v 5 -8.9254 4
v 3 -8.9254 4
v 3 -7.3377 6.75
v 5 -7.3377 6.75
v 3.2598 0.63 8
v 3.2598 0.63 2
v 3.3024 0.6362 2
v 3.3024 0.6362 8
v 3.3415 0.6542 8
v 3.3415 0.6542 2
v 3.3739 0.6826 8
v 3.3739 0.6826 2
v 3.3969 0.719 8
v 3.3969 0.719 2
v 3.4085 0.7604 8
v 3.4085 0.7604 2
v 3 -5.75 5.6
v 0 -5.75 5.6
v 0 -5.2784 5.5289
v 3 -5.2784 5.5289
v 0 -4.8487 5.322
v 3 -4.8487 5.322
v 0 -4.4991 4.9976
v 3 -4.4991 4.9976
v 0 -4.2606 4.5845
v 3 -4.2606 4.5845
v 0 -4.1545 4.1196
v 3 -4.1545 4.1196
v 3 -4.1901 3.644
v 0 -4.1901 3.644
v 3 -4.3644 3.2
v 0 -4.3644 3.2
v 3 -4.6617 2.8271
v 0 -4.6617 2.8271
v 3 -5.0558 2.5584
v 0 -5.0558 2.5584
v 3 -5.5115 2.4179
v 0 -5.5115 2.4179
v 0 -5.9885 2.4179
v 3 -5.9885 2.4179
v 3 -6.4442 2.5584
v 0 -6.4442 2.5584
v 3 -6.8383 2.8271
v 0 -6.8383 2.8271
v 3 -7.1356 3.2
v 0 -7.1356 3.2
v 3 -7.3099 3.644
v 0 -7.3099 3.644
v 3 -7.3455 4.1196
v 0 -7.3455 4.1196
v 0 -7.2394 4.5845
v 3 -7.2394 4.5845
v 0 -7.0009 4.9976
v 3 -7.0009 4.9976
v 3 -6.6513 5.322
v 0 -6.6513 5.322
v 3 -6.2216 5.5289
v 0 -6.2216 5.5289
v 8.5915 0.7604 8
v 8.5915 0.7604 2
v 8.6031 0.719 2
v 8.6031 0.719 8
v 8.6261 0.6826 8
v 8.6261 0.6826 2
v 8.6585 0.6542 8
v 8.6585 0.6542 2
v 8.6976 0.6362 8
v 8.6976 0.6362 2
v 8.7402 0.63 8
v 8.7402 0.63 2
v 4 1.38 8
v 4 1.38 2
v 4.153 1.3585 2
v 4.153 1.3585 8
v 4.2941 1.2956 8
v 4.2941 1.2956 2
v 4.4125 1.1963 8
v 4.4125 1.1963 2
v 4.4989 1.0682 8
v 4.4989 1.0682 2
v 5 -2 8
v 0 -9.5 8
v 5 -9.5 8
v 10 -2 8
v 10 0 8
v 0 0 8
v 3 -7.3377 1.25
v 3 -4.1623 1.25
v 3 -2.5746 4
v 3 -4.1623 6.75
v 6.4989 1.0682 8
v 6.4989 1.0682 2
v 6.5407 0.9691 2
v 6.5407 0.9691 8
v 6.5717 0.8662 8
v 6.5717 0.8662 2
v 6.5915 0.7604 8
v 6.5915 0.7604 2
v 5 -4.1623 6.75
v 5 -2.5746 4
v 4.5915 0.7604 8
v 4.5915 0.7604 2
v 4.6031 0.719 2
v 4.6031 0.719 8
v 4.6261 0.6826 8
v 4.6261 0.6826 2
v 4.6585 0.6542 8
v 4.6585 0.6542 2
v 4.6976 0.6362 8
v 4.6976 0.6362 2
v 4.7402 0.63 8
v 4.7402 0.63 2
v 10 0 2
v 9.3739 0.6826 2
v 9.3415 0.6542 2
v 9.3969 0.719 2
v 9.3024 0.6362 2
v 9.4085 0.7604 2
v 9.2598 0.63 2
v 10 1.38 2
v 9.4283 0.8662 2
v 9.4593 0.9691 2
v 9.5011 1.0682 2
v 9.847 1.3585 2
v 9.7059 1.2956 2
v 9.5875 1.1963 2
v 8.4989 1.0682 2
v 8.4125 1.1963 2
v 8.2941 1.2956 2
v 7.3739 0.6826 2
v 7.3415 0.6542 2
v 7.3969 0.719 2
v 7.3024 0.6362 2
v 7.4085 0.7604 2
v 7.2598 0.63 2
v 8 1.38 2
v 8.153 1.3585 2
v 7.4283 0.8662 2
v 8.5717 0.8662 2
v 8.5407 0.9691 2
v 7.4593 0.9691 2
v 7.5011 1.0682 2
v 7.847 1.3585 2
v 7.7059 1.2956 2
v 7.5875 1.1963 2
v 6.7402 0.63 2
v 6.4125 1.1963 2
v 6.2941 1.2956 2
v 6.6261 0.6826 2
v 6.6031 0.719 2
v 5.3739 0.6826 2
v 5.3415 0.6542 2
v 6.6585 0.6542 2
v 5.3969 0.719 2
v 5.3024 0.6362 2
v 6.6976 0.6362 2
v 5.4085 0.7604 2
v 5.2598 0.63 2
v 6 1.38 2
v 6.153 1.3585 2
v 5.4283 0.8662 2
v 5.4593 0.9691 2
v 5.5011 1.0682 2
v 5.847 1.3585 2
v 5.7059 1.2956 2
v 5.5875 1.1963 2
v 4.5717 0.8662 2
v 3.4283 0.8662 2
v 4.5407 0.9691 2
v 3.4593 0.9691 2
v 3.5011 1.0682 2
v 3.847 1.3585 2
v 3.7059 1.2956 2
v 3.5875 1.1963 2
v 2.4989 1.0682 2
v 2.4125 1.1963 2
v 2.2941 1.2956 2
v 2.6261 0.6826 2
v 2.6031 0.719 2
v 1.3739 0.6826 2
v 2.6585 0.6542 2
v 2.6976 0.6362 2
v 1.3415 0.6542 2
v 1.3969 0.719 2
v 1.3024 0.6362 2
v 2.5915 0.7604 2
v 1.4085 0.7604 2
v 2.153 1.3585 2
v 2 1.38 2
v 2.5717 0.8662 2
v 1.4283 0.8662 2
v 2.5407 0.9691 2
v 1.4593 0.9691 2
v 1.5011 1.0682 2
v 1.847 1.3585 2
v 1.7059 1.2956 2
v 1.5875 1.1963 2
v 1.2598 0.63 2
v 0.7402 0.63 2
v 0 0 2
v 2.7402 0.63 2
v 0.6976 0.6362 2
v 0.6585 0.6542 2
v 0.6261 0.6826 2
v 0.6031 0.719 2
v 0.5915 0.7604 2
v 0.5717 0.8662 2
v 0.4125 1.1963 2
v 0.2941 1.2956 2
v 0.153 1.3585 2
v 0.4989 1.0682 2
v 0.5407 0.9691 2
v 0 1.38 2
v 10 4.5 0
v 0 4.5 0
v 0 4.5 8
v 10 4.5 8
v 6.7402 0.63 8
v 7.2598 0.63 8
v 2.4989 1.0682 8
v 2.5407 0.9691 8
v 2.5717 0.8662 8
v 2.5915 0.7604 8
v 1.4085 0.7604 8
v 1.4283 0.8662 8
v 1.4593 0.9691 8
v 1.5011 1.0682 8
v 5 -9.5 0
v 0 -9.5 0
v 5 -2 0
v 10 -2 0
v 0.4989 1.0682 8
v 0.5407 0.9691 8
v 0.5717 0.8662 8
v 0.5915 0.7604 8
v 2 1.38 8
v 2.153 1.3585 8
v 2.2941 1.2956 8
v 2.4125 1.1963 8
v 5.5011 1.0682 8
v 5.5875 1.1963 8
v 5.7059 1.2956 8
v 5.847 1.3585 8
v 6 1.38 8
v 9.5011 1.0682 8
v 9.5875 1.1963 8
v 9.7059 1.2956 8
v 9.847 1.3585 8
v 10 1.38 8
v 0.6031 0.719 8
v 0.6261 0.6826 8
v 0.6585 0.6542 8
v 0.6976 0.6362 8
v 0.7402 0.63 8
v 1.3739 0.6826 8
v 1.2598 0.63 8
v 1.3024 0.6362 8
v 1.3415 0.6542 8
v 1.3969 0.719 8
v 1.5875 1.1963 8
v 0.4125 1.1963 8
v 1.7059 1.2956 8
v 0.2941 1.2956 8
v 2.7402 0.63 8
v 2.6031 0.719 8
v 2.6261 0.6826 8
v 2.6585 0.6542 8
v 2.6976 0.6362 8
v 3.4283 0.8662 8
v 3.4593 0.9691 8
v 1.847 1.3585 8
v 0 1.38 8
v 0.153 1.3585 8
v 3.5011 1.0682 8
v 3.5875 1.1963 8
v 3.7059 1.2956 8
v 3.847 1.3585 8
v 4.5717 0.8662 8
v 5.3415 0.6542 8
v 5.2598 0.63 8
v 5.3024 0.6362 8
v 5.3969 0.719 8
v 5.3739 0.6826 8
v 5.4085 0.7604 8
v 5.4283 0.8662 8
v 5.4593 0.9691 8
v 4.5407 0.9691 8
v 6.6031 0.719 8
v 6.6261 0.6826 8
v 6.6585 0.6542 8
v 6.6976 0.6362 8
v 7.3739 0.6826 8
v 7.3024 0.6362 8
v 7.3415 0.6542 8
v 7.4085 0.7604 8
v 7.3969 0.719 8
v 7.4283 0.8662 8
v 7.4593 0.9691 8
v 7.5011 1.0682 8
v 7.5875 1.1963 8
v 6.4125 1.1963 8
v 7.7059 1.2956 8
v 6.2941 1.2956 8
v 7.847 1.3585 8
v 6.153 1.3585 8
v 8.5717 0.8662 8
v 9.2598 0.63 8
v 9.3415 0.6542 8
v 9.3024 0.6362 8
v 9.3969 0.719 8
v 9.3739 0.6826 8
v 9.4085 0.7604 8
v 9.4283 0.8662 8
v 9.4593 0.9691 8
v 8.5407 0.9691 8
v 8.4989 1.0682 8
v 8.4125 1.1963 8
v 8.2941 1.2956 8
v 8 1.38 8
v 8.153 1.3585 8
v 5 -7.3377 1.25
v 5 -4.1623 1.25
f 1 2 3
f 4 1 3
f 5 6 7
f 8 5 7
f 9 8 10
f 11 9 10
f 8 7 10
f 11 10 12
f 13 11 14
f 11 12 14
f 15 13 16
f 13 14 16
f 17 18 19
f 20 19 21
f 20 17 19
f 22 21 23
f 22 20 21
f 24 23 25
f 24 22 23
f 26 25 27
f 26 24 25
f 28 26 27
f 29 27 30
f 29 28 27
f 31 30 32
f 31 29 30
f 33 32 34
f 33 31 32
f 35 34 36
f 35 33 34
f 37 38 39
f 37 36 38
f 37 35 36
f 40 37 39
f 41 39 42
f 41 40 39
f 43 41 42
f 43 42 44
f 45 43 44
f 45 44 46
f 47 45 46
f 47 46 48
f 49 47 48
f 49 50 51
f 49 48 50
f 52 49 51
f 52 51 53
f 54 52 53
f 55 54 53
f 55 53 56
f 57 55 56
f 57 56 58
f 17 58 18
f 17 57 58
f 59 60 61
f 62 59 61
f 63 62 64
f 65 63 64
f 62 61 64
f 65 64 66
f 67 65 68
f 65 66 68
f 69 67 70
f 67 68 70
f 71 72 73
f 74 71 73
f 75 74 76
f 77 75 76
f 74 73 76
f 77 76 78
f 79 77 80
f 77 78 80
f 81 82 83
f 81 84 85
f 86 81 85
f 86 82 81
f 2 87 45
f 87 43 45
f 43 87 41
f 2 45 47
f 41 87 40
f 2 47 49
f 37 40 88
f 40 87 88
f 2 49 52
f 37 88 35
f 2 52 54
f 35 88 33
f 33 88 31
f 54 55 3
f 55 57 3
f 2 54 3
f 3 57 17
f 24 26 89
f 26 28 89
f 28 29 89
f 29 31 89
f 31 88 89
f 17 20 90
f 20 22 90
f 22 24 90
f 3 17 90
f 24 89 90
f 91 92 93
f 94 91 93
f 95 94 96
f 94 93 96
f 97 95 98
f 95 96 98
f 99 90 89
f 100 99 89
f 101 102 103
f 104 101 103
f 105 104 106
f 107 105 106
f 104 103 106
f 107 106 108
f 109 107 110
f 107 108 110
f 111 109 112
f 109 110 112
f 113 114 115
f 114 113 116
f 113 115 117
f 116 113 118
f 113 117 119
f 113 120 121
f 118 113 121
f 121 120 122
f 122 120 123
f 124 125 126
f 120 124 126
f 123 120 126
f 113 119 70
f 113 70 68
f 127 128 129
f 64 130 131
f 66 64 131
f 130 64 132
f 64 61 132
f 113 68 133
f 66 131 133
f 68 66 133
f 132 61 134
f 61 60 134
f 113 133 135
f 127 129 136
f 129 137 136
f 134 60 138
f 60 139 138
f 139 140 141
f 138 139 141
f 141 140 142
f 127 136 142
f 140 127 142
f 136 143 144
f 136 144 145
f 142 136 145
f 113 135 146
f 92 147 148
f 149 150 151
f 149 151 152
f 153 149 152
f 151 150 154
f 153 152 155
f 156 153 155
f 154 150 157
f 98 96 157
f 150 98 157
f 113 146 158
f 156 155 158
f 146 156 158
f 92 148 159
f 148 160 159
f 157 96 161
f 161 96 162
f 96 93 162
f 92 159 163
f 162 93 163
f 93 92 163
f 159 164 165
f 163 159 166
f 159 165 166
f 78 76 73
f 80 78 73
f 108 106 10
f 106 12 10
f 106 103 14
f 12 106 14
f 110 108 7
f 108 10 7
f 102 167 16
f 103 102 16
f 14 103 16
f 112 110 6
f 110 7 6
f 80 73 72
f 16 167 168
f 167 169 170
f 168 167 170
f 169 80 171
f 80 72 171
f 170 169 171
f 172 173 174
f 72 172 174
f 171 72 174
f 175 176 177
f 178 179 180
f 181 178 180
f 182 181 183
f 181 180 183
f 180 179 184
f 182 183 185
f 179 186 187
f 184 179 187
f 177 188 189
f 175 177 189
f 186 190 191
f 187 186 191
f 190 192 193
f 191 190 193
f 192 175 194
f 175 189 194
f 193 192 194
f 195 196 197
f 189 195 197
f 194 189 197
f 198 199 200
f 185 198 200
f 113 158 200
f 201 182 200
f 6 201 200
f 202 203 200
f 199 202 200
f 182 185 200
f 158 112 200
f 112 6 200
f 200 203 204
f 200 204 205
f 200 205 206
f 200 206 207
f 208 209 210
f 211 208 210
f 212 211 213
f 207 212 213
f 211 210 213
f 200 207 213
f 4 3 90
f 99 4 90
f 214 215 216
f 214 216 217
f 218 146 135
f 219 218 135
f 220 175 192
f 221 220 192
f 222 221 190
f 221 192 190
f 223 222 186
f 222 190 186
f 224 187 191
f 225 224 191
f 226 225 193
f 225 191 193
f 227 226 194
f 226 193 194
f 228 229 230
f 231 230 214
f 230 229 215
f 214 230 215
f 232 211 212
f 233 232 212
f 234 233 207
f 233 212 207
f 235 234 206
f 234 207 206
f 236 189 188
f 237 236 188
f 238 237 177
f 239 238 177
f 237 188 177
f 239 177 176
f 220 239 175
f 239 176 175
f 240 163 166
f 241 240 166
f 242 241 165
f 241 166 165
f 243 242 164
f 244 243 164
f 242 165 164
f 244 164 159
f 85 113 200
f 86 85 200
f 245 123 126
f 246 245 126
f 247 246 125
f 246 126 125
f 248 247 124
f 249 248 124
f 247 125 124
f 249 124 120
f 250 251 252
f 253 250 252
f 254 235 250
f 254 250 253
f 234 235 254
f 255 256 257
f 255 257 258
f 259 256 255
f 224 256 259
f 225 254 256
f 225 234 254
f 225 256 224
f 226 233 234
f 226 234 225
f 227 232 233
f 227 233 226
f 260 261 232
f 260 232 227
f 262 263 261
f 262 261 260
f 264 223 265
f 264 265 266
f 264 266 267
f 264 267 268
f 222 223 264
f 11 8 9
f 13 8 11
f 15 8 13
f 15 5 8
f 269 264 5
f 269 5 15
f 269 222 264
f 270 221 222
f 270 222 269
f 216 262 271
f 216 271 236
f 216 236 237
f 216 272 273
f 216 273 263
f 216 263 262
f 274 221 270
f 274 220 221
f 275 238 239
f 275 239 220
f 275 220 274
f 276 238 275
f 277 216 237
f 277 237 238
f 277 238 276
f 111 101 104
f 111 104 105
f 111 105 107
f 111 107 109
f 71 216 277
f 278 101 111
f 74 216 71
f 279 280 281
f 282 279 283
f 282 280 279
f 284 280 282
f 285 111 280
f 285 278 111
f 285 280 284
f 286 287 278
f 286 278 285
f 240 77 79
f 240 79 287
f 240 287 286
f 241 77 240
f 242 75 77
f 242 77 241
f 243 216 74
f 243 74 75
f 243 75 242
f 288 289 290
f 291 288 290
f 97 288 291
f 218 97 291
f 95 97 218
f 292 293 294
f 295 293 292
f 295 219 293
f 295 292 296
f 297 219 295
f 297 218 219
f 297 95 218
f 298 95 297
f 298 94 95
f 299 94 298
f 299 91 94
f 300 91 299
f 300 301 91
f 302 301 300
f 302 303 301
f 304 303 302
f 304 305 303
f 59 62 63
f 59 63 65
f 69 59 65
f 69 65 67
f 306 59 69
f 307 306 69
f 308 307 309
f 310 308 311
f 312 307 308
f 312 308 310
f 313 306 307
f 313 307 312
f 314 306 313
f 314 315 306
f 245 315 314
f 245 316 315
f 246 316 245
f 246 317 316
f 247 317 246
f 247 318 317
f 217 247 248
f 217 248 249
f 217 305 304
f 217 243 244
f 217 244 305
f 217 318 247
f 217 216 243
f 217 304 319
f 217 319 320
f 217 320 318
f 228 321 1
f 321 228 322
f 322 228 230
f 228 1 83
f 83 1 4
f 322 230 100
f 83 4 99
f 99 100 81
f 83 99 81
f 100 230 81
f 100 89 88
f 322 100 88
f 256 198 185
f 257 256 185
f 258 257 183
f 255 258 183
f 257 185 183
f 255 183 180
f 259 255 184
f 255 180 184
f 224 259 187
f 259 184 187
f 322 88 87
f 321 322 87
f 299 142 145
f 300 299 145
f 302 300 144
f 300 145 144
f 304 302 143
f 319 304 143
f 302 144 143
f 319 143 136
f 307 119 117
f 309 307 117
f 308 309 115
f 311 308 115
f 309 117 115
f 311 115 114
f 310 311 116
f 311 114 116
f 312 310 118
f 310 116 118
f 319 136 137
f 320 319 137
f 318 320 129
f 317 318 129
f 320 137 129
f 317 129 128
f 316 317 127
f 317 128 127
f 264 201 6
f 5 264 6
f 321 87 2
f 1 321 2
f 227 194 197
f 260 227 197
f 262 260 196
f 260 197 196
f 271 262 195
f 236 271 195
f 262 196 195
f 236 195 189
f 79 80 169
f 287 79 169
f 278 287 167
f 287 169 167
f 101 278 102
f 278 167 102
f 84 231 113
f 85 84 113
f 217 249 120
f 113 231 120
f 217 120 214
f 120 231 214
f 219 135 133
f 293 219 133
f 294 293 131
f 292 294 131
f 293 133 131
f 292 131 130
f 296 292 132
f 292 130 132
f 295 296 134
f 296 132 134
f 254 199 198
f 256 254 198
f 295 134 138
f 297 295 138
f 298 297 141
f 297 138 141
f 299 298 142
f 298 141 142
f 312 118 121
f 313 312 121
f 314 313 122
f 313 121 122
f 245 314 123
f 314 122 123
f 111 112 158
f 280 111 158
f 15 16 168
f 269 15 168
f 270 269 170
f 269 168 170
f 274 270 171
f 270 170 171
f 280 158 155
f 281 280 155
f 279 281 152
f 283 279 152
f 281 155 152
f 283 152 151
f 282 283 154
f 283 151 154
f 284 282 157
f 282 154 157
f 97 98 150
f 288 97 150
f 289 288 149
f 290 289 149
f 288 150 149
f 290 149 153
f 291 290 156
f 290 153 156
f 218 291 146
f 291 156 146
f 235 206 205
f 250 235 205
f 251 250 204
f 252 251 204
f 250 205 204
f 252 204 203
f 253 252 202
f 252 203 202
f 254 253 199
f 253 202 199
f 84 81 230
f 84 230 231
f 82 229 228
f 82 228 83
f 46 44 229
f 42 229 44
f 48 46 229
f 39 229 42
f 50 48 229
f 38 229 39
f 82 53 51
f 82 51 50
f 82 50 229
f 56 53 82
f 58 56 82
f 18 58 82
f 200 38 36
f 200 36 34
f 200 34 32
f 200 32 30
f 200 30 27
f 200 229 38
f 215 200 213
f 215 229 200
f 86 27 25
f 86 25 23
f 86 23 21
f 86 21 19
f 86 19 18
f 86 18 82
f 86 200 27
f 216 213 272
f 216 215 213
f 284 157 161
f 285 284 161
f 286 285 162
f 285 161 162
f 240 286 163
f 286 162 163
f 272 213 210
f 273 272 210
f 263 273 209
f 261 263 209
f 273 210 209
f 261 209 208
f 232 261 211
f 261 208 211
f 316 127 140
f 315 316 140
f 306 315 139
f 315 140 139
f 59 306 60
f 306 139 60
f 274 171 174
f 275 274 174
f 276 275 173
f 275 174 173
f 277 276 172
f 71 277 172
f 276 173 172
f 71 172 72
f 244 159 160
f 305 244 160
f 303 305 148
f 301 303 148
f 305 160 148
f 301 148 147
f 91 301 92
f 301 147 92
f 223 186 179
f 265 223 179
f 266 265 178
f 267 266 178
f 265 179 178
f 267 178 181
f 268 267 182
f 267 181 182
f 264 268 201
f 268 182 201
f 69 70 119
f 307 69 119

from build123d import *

# Parameters (mm, degrees)
SKETCH3_W           = 10
SKETCH3_H           = 6.5
BOSS_EXTRUDE2_DEPTH = 8
CUT_EXTRUDE1_START  = 2
CUT_EXTRUDE1_DEPTH  = 6
LPATTERN2_COUNT     = 7
LPATTERN2_PITCH     = 2
SKETCH4_W           = 8
SKETCH4_H           = 7.5
BOSS_EXTRUDE3_DEPTH = 5
CUT_EXTRUDE2_START  = -3
CUT_EXTRUDE2_DEPTH  = 2
SKETCH6_R           = 1.6
CUT_EXTRUDE3_DEPTH  = 10


with BuildPart() as part:
    # Sketch3 → Boss-Extrude2 (new body)
    with BuildSketch(Plane.XY):
        with Locations((5, 1.25)):
            Rectangle(SKETCH3_W, SKETCH3_H)
    extrude(amount=BOSS_EXTRUDE2_DEPTH)

    # Sketch1 → Cut-Extrude1 (cut)
    with BuildSketch(Plane.XY.offset(CUT_EXTRUDE1_START)):
        with BuildLine():
            Line((0.740175425, 0.63), (1.259824575, 0.63))
            ThreePointArc((1.259824575, 0.63), (1.358731646, 0.667228588), (1.408543109, 0.760434783))
            ThreePointArc((1.408543109, 0.760434783), (1.442388286, 0.918062154), (1.501123596, 1.068202247))
            ThreePointArc((1.501123596, 1.068202247), (1.705850588, 1.295639059), (2, 1.38))
            Line((2, 1.38), (2, 0))
            Line((2, 0), (0, 0))
            Line((0, 0), (0, 1.38))
            ThreePointArc((0, 1.38), (0.294149412, 1.295639059), (0.498876404, 1.068202247))
            ThreePointArc((0.498876404, 1.068202247), (0.557611714, 0.918062154), (0.591456891, 0.760434783))
            ThreePointArc((0.591456891, 0.760434783), (0.641268354, 0.667228588), (0.740175425, 0.63))
        make_face()
    cut_extrude1 = extrude(amount=CUT_EXTRUDE1_DEPTH, mode=Mode.SUBTRACT)

    # LPattern2: Cut-Extrude1 ×7
    with Locations(*[(i * LPATTERN2_PITCH, 0, 0) for i in range(1, LPATTERN2_COUNT)]):
        add(cut_extrude1, mode=Mode.SUBTRACT)

    # Sketch4 → Boss-Extrude3 (add)
    with BuildSketch(Plane.ZY):
        with Locations((4, -5.75)):
            Rectangle(SKETCH4_W, SKETCH4_H)
    extrude(amount=-BOSS_EXTRUDE3_DEPTH)

    # Sketch5 → Cut-Extrude2 (cut)
    with BuildSketch(Plane.ZY.offset(CUT_EXTRUDE2_START)):
        Polygon((1.25, -4.16228676), (1.25, -7.33771324), (4, -8.925426481), (6.75, -7.33771324), (6.75, -4.16228676), (4, -2.574573519), align=None)
    extrude(amount=-CUT_EXTRUDE2_DEPTH, mode=Mode.SUBTRACT)

    # Sketch6 → Cut-Extrude3 (cut)
    with BuildSketch(Plane.ZY.offset(-3)):
        with Locations((4, -5.75)):
            Circle(SKETCH6_R)
    extrude(amount=CUT_EXTRUDE3_DEPTH, mode=Mode.SUBTRACT)


solid = part.part
